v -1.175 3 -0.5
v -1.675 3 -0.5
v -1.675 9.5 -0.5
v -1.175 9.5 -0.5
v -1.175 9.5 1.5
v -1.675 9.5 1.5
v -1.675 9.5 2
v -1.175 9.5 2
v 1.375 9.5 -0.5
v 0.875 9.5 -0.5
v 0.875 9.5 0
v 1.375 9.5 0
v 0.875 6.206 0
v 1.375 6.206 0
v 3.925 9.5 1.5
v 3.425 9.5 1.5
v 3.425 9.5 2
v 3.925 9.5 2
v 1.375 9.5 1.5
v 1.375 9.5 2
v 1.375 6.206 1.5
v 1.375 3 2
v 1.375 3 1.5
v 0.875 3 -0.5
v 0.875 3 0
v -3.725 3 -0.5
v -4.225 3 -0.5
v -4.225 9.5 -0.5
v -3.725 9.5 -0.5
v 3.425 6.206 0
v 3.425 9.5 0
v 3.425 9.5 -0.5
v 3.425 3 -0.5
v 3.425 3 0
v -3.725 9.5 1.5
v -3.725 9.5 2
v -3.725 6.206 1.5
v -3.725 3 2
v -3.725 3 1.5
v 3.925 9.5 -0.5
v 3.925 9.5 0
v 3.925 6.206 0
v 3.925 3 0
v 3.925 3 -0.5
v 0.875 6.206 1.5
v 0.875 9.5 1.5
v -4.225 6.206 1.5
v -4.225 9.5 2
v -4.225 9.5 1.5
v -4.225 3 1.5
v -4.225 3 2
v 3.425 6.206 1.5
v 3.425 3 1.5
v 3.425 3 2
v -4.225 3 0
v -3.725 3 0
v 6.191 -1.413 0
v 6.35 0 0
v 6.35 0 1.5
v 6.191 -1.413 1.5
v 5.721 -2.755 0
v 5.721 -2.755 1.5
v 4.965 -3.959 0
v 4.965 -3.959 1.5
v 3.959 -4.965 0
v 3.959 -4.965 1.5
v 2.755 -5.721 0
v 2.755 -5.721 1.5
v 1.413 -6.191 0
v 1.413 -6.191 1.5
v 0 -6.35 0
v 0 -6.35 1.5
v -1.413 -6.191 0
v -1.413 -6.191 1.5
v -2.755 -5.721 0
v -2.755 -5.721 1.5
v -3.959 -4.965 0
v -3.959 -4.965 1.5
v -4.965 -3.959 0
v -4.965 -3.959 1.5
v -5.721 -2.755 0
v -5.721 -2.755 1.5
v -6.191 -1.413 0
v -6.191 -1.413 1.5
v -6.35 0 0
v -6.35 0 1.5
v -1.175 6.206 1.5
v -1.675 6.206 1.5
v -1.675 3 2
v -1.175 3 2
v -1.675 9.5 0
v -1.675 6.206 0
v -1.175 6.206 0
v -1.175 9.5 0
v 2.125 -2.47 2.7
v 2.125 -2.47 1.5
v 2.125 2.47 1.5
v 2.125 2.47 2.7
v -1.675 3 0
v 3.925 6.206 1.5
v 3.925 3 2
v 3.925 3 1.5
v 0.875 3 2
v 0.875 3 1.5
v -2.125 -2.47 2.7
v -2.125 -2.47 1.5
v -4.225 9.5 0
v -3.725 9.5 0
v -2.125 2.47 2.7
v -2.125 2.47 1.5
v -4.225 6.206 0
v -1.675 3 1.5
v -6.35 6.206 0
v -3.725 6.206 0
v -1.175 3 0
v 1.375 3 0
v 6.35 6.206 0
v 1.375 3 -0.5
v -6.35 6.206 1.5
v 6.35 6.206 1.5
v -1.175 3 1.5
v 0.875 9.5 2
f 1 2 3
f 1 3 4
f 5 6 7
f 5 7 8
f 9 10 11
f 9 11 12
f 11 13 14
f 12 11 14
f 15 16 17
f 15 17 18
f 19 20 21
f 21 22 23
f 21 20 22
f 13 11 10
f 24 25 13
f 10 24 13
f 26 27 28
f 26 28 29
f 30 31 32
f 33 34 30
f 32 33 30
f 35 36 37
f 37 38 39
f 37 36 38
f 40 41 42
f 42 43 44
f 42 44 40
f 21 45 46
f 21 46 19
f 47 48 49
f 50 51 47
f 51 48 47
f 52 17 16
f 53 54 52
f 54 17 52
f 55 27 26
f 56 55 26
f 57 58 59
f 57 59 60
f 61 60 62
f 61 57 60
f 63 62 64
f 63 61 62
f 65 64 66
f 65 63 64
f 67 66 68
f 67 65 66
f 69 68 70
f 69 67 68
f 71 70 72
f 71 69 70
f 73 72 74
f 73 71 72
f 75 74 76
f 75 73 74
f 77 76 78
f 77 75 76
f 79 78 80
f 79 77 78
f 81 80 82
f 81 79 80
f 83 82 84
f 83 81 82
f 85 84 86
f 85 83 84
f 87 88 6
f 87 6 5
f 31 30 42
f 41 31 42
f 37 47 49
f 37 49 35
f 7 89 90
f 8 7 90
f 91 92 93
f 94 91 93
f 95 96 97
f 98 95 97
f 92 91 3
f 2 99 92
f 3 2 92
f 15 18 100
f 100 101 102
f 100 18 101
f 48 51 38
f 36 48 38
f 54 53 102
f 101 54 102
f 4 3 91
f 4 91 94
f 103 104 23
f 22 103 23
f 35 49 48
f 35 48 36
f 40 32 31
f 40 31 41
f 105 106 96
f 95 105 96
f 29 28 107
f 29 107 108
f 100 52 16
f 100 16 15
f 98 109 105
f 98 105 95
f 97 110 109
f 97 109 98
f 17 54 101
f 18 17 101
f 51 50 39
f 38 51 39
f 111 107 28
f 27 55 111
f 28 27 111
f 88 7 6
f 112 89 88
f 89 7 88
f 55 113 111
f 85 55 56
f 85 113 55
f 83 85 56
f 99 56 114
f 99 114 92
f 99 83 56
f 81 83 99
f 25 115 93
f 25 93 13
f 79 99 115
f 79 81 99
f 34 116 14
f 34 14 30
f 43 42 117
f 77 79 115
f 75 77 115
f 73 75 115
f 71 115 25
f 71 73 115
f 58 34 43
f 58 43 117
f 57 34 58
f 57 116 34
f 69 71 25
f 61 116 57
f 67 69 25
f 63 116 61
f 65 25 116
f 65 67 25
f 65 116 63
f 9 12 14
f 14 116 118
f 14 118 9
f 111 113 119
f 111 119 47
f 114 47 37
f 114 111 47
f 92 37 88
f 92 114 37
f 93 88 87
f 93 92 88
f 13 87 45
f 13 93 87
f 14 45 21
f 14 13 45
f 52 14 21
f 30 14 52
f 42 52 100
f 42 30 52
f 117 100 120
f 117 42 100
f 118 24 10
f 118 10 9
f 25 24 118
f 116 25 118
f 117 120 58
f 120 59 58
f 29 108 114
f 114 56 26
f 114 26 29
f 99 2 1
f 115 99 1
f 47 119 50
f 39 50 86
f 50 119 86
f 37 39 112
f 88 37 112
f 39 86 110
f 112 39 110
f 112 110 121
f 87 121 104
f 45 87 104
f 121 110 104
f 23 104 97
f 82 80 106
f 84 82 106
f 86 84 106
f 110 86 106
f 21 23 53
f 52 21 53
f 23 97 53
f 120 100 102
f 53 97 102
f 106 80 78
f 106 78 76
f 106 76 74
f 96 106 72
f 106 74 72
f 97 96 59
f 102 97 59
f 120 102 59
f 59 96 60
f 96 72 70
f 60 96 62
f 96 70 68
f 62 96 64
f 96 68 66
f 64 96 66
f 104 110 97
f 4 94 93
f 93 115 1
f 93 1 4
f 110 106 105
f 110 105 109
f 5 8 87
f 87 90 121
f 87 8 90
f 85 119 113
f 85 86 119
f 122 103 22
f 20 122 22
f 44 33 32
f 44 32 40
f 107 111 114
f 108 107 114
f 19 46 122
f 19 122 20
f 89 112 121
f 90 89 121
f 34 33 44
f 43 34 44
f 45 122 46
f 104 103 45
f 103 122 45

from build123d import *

# Parameters (mm, degrees)
P_IDAT_VYSUNUT_M1_DEPTH  = 1.5
P_IDAT_START             = 1.5
SKICA1_3_W               = 4.25
SKICA1_3_H               = 4.94
P_IDAT_VYSUNUT_M2_DEPTH  = 1.2
SKICA3_W                 = 12.7
SKICA3_H                 = 1.5
ODEBRAT_VYSUNUT_M1_DEPTH = 3.5
SKICA4_W                 = 12.7
SKICA4_H                 = 1.5
ODEBRAT_VYSUNUT_M2_DEPTH = 5.5
SKICA7_W                 = 12.7
SKICA7_H                 = 1.5
P_IDAT_VYSUNUT_M5_DEPTH  = 2.7055
P_IDAT_START_2           = 3
SKICA15_W                = 0.5
SKICA15_H                = 0.5
P_IDAT_VYSUNUT_M14_DEPTH = 6.5
LINPOLE3_COUNT           = 4
LINPOLE3_PITCH           = 2.55
LINPOLE4_COUNT           = 2
LINPOLE4_PITCH           = 2
LINPOLE4_START           = 3
LINPOLE4_COPY_1_SKETCH_W = 0.5
LINPOLE4_COPY_1_SKETCH_H = 0.5
LINPOLE4_COPY_1_DEPTH    = 6.5
LINPOLE4_COPY_2_SKETCH_W = 0.5
LINPOLE4_COPY_2_SKETCH_H = 0.5
LINPOLE4_COPY_2_DEPTH    = 6.5
LINPOLE4_COPY_3_SKETCH_W = 0.5
LINPOLE4_COPY_3_SKETCH_H = 0.5
LINPOLE4_COPY_3_DEPTH    = 6.5


with BuildPart() as part:
    # Skica1 → Přidat vysunutím1 (new body)
    with BuildSketch(Plane.XY):
        with BuildLine():
            Line((-6.35, 0), (-6.35, 12.5))
            Line((-6.35, 12.5), (6.35, 12.5))
            Line((6.35, 12.5), (6.35, 0))
            ThreePointArc((6.35, 0), (0, -6.35), (-6.35, 0))
        make_face()
    extrude(amount=P_IDAT_VYSUNUT_M1_DEPTH)

    # Skica1<3> → Přidat vysunutím2 (add)
    with BuildSketch(Plane.XY.offset(P_IDAT_START)):
        Rectangle(SKICA1_3_W, SKICA1_3_H)
    extrude(amount=P_IDAT_VYSUNUT_M2_DEPTH)

    # Skica3 → Odebrat vysunutím1 (cut)
    with BuildSketch(Plane(origin=(0, 12.5, 0), x_dir=(1, 0, 0), z_dir=(0, 1, 0))):
        with Locations((0, -0.75)):
            Rectangle(SKICA3_W, SKICA3_H)
    extrude(amount=-ODEBRAT_VYSUNUT_M1_DEPTH, mode=Mode.SUBTRACT)

    # Skica4 → Odebrat vysunutím2 (cut)
    with BuildSketch(Plane(origin=(0, 9, 0), x_dir=(1, 0, 0), z_dir=(0, 1, 0))):
        with Locations((0, -0.75)):
            Rectangle(SKICA4_W, SKICA4_H)
    extrude(amount=-ODEBRAT_VYSUNUT_M2_DEPTH, mode=Mode.SUBTRACT)

    # Skica7 → Přidat vysunutím5 (add)
    with BuildSketch(Plane(origin=(0, 3.5, 0), x_dir=(1, 0, 0), z_dir=(0, 1, 0))):
        with Locations((0, -0.75)):
            Rectangle(SKICA7_W, SKICA7_H)
    extrude(amount=P_IDAT_VYSUNUT_M5_DEPTH)

    # Skica15 → Přidat vysunutím14 (add)
    with BuildSketch(Plane(origin=(0, 0, 0), x_dir=(1, 0, 0), z_dir=(0, 1, 0)).offset(P_IDAT_START_2)):
        with Locations((-3.975, -1.75)):
            Rectangle(SKICA15_W, SKICA15_H)
    p_idat_vysunut_m14 = extrude(amount=P_IDAT_VYSUNUT_M14_DEPTH)

    # LinPole3: Přidat vysunutím14 ×4
    with Locations(*[(i * LINPOLE3_PITCH, 0, 0) for i in range(1, LINPOLE3_COUNT)]):
        add(p_idat_vysunut_m14)

    # LinPole4: Přidat vysunutím14 ×2
    with Locations(*[(0, 0, -i * LINPOLE4_PITCH) for i in range(1, LINPOLE4_COUNT)]):
        add(p_idat_vysunut_m14)

    # LinPole4 copy 1 sketch → LinPole4 copy 1 (add)
    with BuildSketch(Plane(origin=(2.55, 0, -2), x_dir=(1, 0, 0), z_dir=(0, 1, 0)).offset(LINPOLE4_START)):
        with Locations((-3.975, -1.75)):
            Rectangle(LINPOLE4_COPY_1_SKETCH_W, LINPOLE4_COPY_1_SKETCH_H)
    extrude(amount=LINPOLE4_COPY_1_DEPTH)

    # LinPole4 copy 2 sketch → LinPole4 copy 2 (add)
    with BuildSketch(Plane(origin=(5.1, 0, -2), x_dir=(1, 0, 0), z_dir=(0, 1, 0)).offset(LINPOLE4_START)):
        with Locations((-3.975, -1.75)):
            Rectangle(LINPOLE4_COPY_2_SKETCH_W, LINPOLE4_COPY_2_SKETCH_H)
    extrude(amount=LINPOLE4_COPY_2_DEPTH)

    # LinPole4 copy 3 sketch → LinPole4 copy 3 (add)
    with BuildSketch(Plane(origin=(7.65, 0, -2), x_dir=(1, 0, 0), z_dir=(0, 1, 0)).offset(LINPOLE4_START)):
        with Locations((-3.975, -1.75)):
            Rectangle(LINPOLE4_COPY_3_SKETCH_W, LINPOLE4_COPY_3_SKETCH_H)
    extrude(amount=LINPOLE4_COPY_3_DEPTH)


solid = part.part
